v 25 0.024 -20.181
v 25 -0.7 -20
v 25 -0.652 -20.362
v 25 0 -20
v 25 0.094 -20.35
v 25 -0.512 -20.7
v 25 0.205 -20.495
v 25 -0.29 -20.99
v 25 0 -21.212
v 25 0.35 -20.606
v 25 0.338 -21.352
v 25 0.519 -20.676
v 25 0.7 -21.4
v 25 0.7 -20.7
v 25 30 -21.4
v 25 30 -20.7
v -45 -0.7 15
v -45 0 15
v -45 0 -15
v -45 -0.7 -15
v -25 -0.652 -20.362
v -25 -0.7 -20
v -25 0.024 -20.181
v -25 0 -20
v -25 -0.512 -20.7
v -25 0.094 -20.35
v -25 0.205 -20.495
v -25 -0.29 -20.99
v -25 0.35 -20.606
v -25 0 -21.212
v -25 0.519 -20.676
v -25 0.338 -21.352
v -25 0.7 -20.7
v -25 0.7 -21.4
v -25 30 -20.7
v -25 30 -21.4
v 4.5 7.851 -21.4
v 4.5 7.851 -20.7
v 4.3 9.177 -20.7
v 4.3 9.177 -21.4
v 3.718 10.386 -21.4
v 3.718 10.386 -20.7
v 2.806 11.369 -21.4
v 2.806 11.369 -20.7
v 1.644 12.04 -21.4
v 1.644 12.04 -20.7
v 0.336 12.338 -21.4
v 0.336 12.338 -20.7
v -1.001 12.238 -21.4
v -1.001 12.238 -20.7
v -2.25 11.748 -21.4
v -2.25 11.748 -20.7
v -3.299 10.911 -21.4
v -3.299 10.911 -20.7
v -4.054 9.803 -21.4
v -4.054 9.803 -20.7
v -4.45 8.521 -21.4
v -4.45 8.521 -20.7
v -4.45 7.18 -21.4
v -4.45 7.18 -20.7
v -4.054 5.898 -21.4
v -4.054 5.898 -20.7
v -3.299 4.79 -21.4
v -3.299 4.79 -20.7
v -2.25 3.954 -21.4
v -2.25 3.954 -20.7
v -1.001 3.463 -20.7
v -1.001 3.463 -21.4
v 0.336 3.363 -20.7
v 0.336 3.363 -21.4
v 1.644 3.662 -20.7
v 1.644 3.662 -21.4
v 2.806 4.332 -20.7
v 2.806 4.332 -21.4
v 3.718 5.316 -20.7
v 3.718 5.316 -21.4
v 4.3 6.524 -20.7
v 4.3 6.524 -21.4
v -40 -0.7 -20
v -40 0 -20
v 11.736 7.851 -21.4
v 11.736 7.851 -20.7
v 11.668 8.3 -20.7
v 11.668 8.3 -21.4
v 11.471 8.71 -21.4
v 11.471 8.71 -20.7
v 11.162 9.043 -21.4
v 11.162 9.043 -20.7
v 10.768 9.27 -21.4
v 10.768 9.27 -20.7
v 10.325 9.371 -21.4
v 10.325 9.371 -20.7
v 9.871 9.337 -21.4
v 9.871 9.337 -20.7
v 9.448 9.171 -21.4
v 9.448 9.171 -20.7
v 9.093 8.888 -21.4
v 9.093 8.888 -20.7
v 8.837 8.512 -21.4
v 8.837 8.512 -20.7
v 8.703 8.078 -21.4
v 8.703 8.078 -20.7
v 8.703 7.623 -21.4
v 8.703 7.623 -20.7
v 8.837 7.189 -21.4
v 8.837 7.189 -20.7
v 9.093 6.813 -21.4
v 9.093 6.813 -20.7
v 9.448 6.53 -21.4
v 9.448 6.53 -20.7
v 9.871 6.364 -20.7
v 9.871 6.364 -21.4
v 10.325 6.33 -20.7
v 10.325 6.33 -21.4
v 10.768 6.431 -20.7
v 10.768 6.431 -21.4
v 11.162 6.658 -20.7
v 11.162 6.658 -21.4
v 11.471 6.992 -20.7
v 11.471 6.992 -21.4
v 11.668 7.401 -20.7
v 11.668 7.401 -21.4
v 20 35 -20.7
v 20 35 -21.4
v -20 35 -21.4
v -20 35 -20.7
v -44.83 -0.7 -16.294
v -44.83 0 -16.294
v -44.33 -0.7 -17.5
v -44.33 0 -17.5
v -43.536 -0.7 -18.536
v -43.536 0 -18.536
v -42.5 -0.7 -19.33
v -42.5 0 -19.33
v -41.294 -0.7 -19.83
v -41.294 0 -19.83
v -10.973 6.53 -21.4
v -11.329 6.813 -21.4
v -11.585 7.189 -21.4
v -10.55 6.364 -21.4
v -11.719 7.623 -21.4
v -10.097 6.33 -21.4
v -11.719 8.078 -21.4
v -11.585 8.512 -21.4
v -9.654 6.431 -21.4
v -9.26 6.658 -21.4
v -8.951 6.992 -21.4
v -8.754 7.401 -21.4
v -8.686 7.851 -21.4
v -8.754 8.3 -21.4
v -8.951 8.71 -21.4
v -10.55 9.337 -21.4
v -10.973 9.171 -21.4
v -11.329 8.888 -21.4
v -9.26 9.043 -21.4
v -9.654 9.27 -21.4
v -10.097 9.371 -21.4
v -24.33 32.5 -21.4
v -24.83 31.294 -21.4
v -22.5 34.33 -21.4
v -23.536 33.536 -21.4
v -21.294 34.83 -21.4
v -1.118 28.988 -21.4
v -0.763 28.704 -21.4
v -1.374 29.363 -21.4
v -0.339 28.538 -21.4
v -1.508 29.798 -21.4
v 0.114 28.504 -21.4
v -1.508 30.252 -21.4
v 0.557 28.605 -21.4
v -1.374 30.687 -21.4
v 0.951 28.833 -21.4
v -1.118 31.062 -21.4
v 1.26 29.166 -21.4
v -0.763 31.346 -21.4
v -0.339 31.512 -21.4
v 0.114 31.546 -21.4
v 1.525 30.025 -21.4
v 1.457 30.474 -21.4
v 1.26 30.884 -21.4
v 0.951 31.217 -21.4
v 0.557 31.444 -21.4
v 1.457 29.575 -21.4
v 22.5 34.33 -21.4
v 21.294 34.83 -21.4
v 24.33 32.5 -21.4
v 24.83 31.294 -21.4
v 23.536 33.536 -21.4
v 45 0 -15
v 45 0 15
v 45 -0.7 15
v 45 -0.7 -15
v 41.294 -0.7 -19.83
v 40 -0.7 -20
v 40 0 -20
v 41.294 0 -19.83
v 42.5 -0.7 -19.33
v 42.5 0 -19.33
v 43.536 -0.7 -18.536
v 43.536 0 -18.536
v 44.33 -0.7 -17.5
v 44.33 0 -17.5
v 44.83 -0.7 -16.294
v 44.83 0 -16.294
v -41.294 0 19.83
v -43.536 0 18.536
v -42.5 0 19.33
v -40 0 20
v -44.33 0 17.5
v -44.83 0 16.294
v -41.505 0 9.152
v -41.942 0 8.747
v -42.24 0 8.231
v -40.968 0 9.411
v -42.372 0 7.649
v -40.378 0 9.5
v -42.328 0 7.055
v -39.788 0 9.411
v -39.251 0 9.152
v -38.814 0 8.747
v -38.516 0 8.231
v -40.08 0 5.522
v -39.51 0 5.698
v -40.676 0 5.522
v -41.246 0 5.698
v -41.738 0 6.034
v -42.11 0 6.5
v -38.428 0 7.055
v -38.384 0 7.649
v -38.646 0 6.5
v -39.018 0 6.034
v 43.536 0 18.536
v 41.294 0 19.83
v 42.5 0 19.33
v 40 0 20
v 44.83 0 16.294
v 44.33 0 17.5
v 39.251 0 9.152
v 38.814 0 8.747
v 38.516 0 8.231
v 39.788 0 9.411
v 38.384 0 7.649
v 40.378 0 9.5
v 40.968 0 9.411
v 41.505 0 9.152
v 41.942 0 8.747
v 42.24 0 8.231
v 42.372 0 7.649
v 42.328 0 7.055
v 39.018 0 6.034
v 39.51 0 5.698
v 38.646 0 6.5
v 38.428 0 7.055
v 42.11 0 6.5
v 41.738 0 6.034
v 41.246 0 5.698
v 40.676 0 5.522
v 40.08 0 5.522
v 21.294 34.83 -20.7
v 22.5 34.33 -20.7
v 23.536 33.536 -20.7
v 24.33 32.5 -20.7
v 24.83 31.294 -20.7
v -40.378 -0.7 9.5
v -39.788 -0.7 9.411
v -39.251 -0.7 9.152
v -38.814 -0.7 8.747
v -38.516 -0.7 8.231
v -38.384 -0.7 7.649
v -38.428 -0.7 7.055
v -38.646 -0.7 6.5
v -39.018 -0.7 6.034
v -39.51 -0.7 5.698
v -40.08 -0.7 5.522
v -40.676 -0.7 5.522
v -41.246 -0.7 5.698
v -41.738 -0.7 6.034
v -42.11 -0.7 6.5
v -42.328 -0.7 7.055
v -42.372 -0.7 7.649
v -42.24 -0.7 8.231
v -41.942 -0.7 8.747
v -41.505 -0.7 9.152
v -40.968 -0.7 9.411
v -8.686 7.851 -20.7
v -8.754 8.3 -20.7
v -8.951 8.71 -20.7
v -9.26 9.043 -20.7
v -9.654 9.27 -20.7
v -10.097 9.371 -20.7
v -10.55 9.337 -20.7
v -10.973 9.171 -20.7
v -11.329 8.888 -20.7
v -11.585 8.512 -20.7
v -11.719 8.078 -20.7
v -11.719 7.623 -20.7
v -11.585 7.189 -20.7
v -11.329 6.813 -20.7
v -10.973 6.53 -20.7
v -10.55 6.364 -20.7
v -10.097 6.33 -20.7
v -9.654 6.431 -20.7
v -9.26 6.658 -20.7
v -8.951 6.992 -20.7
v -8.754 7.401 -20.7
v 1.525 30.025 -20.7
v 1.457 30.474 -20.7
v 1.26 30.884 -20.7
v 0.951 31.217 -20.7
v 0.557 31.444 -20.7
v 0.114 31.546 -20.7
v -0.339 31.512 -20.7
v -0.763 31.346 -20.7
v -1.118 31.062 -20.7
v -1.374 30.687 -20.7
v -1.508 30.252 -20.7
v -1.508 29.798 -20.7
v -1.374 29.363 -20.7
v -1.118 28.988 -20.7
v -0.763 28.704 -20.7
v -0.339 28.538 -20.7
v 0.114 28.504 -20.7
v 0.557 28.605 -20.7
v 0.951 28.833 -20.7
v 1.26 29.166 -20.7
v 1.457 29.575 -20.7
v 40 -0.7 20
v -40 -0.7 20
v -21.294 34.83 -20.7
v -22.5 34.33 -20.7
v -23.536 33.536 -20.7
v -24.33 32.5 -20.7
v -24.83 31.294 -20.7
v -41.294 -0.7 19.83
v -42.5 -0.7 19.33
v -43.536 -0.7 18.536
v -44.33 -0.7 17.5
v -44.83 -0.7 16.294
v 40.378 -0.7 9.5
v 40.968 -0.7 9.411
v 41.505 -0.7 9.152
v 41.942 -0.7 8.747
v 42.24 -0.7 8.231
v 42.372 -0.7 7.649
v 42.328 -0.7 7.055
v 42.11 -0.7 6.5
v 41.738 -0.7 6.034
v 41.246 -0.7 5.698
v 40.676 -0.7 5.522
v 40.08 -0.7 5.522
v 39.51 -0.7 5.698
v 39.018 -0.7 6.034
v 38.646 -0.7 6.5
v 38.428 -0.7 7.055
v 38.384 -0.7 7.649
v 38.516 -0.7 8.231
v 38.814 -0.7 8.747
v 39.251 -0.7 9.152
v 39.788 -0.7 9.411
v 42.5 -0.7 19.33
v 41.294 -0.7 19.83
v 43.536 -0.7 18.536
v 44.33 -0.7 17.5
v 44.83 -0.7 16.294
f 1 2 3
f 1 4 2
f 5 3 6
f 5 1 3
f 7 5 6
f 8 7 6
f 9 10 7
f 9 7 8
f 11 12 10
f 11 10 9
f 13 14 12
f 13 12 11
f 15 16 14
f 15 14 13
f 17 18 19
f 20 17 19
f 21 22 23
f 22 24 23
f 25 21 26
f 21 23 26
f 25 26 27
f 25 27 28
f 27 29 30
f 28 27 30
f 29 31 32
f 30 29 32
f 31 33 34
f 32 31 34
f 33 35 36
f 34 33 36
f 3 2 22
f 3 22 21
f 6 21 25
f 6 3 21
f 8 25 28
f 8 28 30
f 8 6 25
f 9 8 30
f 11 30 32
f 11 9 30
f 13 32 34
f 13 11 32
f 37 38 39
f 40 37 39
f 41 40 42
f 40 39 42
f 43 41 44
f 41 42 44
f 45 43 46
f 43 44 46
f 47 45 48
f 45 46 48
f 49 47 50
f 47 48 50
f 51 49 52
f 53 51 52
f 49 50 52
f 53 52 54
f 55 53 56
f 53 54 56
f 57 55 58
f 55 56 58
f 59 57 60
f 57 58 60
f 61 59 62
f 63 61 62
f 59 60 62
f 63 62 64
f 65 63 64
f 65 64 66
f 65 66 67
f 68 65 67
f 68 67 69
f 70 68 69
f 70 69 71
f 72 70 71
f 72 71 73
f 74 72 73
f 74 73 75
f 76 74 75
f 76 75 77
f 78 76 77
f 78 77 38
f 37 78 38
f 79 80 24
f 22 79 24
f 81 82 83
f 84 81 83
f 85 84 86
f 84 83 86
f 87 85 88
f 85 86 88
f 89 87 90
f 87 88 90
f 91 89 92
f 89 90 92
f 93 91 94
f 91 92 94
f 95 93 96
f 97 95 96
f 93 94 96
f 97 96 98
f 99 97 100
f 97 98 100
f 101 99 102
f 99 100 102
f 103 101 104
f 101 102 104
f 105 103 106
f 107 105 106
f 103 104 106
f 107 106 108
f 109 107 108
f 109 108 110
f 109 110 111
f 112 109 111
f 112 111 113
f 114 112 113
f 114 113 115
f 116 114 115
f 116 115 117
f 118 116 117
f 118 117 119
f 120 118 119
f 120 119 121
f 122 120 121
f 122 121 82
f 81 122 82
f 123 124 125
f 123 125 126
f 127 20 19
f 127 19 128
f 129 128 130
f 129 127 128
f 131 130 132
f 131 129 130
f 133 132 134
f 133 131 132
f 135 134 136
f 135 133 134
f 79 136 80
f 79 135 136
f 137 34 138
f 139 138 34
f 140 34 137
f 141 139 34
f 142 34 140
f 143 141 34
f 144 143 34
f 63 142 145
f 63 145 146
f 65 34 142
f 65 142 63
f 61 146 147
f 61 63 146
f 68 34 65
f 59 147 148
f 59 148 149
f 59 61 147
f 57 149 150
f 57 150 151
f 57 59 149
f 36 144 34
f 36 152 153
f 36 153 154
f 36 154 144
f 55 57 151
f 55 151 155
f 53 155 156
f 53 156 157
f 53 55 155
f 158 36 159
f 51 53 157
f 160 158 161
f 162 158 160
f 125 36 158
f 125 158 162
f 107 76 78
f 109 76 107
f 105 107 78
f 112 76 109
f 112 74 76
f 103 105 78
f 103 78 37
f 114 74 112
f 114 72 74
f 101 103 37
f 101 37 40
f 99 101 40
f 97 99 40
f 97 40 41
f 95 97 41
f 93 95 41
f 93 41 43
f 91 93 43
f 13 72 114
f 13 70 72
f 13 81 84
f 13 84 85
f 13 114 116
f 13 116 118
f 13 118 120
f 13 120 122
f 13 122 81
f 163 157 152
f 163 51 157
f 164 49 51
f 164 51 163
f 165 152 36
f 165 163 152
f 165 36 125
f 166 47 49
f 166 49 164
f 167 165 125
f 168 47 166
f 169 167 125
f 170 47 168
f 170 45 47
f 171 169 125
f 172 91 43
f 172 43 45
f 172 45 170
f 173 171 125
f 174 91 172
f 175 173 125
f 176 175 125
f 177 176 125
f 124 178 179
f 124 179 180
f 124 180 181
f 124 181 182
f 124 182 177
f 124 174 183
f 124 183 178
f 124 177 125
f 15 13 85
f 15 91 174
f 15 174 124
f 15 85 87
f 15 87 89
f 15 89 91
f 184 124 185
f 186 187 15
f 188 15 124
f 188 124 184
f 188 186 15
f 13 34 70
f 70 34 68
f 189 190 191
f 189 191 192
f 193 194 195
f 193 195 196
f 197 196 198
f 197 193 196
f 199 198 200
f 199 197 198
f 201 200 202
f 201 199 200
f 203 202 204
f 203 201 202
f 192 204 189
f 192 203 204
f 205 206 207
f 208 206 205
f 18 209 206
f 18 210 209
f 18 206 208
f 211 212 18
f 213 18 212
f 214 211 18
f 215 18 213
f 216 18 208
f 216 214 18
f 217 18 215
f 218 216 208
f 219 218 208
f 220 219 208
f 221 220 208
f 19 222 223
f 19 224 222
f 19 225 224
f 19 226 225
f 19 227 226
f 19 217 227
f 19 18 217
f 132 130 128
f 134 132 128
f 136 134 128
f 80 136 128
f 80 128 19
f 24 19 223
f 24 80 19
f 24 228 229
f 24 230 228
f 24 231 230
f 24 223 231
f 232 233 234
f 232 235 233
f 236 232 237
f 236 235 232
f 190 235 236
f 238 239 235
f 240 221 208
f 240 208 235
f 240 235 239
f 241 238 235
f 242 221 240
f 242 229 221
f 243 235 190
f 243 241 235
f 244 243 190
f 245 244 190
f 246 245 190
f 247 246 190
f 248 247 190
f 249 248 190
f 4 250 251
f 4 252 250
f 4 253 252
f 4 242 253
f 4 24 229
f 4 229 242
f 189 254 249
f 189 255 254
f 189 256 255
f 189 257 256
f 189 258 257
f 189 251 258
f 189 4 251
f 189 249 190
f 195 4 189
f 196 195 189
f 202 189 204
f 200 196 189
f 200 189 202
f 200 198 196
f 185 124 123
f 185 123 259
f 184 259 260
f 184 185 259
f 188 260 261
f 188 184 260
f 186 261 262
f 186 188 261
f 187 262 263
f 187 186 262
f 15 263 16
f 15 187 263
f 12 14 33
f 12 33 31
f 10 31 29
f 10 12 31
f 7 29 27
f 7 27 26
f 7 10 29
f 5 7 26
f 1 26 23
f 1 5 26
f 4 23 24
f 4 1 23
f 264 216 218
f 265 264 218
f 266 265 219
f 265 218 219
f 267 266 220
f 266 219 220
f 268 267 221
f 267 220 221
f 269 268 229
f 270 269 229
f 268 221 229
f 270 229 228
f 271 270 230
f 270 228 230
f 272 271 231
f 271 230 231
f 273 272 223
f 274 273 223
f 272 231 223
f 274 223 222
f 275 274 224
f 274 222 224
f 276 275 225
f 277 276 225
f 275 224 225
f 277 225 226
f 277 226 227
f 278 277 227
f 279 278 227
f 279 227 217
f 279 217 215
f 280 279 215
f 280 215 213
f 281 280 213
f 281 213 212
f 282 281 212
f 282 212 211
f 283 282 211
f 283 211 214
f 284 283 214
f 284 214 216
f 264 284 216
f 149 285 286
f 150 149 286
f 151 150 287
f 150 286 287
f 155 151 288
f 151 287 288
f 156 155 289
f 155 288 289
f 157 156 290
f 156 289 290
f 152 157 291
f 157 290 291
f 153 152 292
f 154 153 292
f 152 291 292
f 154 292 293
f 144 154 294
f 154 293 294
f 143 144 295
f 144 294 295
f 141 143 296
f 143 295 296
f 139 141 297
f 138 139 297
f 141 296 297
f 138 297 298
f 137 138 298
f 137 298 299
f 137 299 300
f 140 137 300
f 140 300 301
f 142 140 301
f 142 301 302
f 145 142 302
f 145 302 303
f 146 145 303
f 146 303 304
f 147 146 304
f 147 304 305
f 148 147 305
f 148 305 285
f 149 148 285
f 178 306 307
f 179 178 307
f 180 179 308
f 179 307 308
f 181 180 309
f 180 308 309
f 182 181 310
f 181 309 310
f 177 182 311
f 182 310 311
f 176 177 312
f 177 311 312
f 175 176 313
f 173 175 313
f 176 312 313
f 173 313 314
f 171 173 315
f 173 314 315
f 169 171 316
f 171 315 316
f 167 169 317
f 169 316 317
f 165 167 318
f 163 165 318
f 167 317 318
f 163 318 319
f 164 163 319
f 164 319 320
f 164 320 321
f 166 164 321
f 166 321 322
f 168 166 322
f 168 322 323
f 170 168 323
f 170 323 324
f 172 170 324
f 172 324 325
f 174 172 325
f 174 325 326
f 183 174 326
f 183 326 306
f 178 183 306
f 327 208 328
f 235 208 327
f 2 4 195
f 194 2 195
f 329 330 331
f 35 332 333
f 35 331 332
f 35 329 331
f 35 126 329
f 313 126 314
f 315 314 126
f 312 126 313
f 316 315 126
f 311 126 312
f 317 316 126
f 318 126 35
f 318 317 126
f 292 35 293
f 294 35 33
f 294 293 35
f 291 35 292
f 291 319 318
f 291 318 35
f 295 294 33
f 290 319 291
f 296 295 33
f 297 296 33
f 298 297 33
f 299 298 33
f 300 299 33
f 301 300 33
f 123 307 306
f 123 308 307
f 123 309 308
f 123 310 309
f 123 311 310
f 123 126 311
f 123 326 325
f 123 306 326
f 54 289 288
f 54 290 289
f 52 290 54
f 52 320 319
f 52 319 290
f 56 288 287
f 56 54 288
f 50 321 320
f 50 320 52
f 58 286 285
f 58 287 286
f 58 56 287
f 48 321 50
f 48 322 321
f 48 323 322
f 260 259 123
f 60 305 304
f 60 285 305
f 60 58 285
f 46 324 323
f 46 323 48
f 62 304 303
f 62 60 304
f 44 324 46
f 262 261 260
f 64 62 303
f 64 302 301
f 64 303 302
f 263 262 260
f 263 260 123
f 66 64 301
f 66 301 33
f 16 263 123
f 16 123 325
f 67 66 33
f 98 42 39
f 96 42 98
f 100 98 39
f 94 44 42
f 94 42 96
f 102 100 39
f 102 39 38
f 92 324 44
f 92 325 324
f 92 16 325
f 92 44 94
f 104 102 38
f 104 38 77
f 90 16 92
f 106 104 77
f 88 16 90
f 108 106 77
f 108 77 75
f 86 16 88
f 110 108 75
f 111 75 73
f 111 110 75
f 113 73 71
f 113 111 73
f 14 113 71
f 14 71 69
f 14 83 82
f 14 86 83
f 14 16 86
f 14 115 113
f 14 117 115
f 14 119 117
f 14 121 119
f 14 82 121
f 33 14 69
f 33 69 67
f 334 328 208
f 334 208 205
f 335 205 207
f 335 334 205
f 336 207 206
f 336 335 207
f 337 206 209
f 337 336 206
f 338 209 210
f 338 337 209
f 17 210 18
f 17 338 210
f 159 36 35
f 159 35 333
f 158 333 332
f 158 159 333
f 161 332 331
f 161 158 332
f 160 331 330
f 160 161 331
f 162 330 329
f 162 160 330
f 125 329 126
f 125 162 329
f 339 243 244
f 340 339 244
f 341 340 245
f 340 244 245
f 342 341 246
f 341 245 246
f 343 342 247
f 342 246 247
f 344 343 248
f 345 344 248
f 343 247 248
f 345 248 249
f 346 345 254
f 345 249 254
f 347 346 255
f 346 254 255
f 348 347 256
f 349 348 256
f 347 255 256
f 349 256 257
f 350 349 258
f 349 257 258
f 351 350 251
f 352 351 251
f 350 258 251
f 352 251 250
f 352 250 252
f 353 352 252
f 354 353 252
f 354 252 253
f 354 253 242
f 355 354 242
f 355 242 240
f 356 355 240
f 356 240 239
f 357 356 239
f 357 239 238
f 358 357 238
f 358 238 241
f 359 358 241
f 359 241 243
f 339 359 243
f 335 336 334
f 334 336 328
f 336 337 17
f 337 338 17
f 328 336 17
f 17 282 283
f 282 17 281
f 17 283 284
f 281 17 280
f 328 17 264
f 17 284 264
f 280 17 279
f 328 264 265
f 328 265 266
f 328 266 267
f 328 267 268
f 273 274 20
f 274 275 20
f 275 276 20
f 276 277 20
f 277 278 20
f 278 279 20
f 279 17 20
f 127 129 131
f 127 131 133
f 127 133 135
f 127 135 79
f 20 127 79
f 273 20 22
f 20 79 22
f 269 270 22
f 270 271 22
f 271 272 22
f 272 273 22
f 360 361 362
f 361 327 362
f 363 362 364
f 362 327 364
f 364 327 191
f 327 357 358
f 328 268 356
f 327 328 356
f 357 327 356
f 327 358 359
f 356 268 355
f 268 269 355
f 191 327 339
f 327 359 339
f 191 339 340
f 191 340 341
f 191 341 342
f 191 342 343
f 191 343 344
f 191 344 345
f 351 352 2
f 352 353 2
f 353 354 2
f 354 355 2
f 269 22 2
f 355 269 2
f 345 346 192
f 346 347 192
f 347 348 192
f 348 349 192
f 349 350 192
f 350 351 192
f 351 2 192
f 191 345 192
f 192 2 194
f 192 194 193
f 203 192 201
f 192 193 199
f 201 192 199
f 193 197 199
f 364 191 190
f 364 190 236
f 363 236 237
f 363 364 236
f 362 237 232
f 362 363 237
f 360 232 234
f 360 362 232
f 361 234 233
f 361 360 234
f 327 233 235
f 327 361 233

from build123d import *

# Parameters (mm, degrees)
SKETCH1_W             = 90
SKETCH1_H             = 40
BASE_FLANGE1_DEPTH    = 0.7
EDGE_FLANGE1_DEPTH    = 50
CUT_EXTRUDE1_REACH    = 72.046
SKETCH7_R             = 1.525
CUT_EXTRUDE2_REACH    = 72.046
SKETCH8_R             = 4.5
CUT_EXTRUDE4_REACH    = 62.893
SKETCH10_R            = 2
BREAK_CORNER6_START   = -21.4
BREAK_CORNER6_DEPTH   = 0.7
BREAK_CORNER6_START_2 = -0.7
BREAK_CORNER6_2_DEPTH = 0.7


# Read off the part's stored shape, not the designer's step: Break-Corner6
# Sheet-metal steps are written as plain solids
with BuildPart() as part:
    # Sketch1 → Base-Flange1 (new body)
    with BuildSketch(Plane(origin=(0, 0, 0), x_dir=(1, 0, 0), z_dir=(0, 1, 0))):
        Rectangle(SKETCH1_W, SKETCH1_H)
    extrude(amount=-BASE_FLANGE1_DEPTH)

    # Edge-Flange1 section (across the edge) → Edge-Flange1 (add)
    with BuildSketch(Plane(origin=(25, 0, -20.7), x_dir=(0, 0, 1), z_dir=(-1, 0, 0))):
        with BuildLine():
            Line((-0.7, 0.7), (-0.7, 35))
            Line((-0.7, 35), (0, 35))
            Line((0, 35), (0, 0.7))
            ThreePointArc((0, 0.7), (0.205025253, 0.205025253), (0.7, 0))
            Line((0.7, 0), (0.7, -0.7))
            ThreePointArc((0.7, -0.7), (-0.289949494, -0.289949494), (-0.7, 0.7))
        make_face()
    extrude(amount=EDGE_FLANGE1_DEPTH)

    # Sketch7 → Cut-Extrude1 (cut, up to next)
    with BuildSketch(Plane.XY.offset(-20.7), mode=Mode.PRIVATE) as cut_extrude1_sk1:
        with Locations((0, 30.02483)):
            Circle(SKETCH7_R)
    cut_extrude1_tool1 = extrude(cut_extrude1_sk1.sketch, amount=-CUT_EXTRUDE1_REACH, mode=Mode.PRIVATE) & part.part
    # Sketch7 → Cut-Extrude1 (cut, up to next)
    with BuildSketch(Plane.XY.offset(-20.7), mode=Mode.PRIVATE) as cut_extrude1_sk2:
        with Locations((10.2108, 7.85063)):
            Circle(SKETCH7_R)
    cut_extrude1_tool2 = extrude(cut_extrude1_sk2.sketch, amount=-CUT_EXTRUDE1_REACH, mode=Mode.PRIVATE) & part.part
    # Sketch7 → Cut-Extrude1 (cut, up to next)
    with BuildSketch(Plane.XY.offset(-20.7), mode=Mode.PRIVATE) as cut_extrude1_sk3:
        with Locations((-10.2108, 7.85063)):
            Circle(SKETCH7_R)
    cut_extrude1_tool3 = extrude(cut_extrude1_sk3.sketch, amount=-CUT_EXTRUDE1_REACH, mode=Mode.PRIVATE) & part.part
    add(cut_extrude1_tool1.solids().sort_by_distance((0, 30.02483, -20.7))[0], mode=Mode.SUBTRACT)
    add(cut_extrude1_tool2.solids().sort_by_distance((10.2108, 7.85063, -20.7))[0], mode=Mode.SUBTRACT)
    add(cut_extrude1_tool3.solids().sort_by_distance((-10.2108, 7.85063, -20.7))[0], mode=Mode.SUBTRACT)

    # Sketch8 → Cut-Extrude2 (cut, up to next)
    with BuildSketch(Plane.XY.offset(-20.7), mode=Mode.PRIVATE) as cut_extrude2_sk1:
        with Locations((0, 7.85063)):
            Circle(SKETCH8_R)
    cut_extrude2_tool1 = extrude(cut_extrude2_sk1.sketch, amount=-CUT_EXTRUDE2_REACH, mode=Mode.PRIVATE) & part.part
    add(cut_extrude2_tool1.solids().sort_by_distance((0, 7.85063, -20.7))[0], mode=Mode.SUBTRACT)

    # Sketch10 → Cut-Extrude4 (cut, up to next)
    with BuildSketch(Plane(origin=(0, 0, 0), x_dir=(1, 0, 0), z_dir=(0, 1, 0)), mode=Mode.PRIVATE) as cut_extrude4_sk1:
        with Locations(Location((-40.378, -7.5, 0), (0, 0, 270))):
            Circle(SKETCH10_R)
    cut_extrude4_tool1 = extrude(cut_extrude4_sk1.sketch, amount=-CUT_EXTRUDE4_REACH, mode=Mode.PRIVATE) & part.part
    # Sketch10 → Cut-Extrude4 (cut, up to next)
    with BuildSketch(Plane(origin=(0, 0, 0), x_dir=(1, 0, 0), z_dir=(0, 1, 0)), mode=Mode.PRIVATE) as cut_extrude4_sk2:
        with Locations(Location((40.378, -7.5, 0), (0, 0, 270))):
            Circle(SKETCH10_R)
    cut_extrude4_tool2 = extrude(cut_extrude4_sk2.sketch, amount=-CUT_EXTRUDE4_REACH, mode=Mode.PRIVATE) & part.part
    add(cut_extrude4_tool1.solids().sort_by_distance((-40.378, 0, 7.5))[0], mode=Mode.SUBTRACT)
    add(cut_extrude4_tool2.solids().sort_by_distance((40.378, 0, 7.5))[0], mode=Mode.SUBTRACT)

    # Break-Corner6 outline → Break-Corner6 (cut)
    with BuildSketch(Plane.XY.offset(BREAK_CORNER6_START)):
        with BuildLine():
            ThreePointArc((-25, 30), (-23.535533906, 33.535533906), (-20, 35))
            Line((-20, 35), (-25, 35))
            Line((-25, 35), (-25, 30))
        make_face()
        with BuildLine():
            ThreePointArc((20, 35), (23.535533906, 33.535533906), (25, 30))
            Line((25, 30), (25, 35))
            Line((25, 35), (20, 35))
        make_face()
    extrude(amount=BREAK_CORNER6_DEPTH, mode=Mode.SUBTRACT)

    # Break-Corner6 2 outline → Break-Corner6 2 (cut)
    with BuildSketch(Plane(origin=(0, 0, 0), x_dir=(1, 0, 0), z_dir=(0, 1, 0)).offset(BREAK_CORNER6_START_2)):
        with BuildLine():
            ThreePointArc((40, 20), (43.535533906, 18.535533906), (45, 15))
            Line((45, 15), (45, 20))
            Line((45, 20), (40, 20))
        make_face()
        with BuildLine():
            Line((-45, 20), (-45, 15))
            ThreePointArc((-45, 15), (-43.535533906, 18.535533906), (-40, 20))
            Line((-40, 20), (-45, 20))
        make_face()
        with BuildLine():
            Line((-45, -20), (-40, -20))
            ThreePointArc((-40, -20), (-43.535533906, -18.535533906), (-45, -15))
            Line((-45, -15), (-45, -20))
        make_face()
        with BuildLine():
            ThreePointArc((45, -15), (43.535533906, -18.535533906), (40, -20))
            Line((40, -20), (45, -20))
            Line((45, -20), (45, -15))
        make_face()
    extrude(amount=BREAK_CORNER6_2_DEPTH, mode=Mode.SUBTRACT)


solid = part.part
